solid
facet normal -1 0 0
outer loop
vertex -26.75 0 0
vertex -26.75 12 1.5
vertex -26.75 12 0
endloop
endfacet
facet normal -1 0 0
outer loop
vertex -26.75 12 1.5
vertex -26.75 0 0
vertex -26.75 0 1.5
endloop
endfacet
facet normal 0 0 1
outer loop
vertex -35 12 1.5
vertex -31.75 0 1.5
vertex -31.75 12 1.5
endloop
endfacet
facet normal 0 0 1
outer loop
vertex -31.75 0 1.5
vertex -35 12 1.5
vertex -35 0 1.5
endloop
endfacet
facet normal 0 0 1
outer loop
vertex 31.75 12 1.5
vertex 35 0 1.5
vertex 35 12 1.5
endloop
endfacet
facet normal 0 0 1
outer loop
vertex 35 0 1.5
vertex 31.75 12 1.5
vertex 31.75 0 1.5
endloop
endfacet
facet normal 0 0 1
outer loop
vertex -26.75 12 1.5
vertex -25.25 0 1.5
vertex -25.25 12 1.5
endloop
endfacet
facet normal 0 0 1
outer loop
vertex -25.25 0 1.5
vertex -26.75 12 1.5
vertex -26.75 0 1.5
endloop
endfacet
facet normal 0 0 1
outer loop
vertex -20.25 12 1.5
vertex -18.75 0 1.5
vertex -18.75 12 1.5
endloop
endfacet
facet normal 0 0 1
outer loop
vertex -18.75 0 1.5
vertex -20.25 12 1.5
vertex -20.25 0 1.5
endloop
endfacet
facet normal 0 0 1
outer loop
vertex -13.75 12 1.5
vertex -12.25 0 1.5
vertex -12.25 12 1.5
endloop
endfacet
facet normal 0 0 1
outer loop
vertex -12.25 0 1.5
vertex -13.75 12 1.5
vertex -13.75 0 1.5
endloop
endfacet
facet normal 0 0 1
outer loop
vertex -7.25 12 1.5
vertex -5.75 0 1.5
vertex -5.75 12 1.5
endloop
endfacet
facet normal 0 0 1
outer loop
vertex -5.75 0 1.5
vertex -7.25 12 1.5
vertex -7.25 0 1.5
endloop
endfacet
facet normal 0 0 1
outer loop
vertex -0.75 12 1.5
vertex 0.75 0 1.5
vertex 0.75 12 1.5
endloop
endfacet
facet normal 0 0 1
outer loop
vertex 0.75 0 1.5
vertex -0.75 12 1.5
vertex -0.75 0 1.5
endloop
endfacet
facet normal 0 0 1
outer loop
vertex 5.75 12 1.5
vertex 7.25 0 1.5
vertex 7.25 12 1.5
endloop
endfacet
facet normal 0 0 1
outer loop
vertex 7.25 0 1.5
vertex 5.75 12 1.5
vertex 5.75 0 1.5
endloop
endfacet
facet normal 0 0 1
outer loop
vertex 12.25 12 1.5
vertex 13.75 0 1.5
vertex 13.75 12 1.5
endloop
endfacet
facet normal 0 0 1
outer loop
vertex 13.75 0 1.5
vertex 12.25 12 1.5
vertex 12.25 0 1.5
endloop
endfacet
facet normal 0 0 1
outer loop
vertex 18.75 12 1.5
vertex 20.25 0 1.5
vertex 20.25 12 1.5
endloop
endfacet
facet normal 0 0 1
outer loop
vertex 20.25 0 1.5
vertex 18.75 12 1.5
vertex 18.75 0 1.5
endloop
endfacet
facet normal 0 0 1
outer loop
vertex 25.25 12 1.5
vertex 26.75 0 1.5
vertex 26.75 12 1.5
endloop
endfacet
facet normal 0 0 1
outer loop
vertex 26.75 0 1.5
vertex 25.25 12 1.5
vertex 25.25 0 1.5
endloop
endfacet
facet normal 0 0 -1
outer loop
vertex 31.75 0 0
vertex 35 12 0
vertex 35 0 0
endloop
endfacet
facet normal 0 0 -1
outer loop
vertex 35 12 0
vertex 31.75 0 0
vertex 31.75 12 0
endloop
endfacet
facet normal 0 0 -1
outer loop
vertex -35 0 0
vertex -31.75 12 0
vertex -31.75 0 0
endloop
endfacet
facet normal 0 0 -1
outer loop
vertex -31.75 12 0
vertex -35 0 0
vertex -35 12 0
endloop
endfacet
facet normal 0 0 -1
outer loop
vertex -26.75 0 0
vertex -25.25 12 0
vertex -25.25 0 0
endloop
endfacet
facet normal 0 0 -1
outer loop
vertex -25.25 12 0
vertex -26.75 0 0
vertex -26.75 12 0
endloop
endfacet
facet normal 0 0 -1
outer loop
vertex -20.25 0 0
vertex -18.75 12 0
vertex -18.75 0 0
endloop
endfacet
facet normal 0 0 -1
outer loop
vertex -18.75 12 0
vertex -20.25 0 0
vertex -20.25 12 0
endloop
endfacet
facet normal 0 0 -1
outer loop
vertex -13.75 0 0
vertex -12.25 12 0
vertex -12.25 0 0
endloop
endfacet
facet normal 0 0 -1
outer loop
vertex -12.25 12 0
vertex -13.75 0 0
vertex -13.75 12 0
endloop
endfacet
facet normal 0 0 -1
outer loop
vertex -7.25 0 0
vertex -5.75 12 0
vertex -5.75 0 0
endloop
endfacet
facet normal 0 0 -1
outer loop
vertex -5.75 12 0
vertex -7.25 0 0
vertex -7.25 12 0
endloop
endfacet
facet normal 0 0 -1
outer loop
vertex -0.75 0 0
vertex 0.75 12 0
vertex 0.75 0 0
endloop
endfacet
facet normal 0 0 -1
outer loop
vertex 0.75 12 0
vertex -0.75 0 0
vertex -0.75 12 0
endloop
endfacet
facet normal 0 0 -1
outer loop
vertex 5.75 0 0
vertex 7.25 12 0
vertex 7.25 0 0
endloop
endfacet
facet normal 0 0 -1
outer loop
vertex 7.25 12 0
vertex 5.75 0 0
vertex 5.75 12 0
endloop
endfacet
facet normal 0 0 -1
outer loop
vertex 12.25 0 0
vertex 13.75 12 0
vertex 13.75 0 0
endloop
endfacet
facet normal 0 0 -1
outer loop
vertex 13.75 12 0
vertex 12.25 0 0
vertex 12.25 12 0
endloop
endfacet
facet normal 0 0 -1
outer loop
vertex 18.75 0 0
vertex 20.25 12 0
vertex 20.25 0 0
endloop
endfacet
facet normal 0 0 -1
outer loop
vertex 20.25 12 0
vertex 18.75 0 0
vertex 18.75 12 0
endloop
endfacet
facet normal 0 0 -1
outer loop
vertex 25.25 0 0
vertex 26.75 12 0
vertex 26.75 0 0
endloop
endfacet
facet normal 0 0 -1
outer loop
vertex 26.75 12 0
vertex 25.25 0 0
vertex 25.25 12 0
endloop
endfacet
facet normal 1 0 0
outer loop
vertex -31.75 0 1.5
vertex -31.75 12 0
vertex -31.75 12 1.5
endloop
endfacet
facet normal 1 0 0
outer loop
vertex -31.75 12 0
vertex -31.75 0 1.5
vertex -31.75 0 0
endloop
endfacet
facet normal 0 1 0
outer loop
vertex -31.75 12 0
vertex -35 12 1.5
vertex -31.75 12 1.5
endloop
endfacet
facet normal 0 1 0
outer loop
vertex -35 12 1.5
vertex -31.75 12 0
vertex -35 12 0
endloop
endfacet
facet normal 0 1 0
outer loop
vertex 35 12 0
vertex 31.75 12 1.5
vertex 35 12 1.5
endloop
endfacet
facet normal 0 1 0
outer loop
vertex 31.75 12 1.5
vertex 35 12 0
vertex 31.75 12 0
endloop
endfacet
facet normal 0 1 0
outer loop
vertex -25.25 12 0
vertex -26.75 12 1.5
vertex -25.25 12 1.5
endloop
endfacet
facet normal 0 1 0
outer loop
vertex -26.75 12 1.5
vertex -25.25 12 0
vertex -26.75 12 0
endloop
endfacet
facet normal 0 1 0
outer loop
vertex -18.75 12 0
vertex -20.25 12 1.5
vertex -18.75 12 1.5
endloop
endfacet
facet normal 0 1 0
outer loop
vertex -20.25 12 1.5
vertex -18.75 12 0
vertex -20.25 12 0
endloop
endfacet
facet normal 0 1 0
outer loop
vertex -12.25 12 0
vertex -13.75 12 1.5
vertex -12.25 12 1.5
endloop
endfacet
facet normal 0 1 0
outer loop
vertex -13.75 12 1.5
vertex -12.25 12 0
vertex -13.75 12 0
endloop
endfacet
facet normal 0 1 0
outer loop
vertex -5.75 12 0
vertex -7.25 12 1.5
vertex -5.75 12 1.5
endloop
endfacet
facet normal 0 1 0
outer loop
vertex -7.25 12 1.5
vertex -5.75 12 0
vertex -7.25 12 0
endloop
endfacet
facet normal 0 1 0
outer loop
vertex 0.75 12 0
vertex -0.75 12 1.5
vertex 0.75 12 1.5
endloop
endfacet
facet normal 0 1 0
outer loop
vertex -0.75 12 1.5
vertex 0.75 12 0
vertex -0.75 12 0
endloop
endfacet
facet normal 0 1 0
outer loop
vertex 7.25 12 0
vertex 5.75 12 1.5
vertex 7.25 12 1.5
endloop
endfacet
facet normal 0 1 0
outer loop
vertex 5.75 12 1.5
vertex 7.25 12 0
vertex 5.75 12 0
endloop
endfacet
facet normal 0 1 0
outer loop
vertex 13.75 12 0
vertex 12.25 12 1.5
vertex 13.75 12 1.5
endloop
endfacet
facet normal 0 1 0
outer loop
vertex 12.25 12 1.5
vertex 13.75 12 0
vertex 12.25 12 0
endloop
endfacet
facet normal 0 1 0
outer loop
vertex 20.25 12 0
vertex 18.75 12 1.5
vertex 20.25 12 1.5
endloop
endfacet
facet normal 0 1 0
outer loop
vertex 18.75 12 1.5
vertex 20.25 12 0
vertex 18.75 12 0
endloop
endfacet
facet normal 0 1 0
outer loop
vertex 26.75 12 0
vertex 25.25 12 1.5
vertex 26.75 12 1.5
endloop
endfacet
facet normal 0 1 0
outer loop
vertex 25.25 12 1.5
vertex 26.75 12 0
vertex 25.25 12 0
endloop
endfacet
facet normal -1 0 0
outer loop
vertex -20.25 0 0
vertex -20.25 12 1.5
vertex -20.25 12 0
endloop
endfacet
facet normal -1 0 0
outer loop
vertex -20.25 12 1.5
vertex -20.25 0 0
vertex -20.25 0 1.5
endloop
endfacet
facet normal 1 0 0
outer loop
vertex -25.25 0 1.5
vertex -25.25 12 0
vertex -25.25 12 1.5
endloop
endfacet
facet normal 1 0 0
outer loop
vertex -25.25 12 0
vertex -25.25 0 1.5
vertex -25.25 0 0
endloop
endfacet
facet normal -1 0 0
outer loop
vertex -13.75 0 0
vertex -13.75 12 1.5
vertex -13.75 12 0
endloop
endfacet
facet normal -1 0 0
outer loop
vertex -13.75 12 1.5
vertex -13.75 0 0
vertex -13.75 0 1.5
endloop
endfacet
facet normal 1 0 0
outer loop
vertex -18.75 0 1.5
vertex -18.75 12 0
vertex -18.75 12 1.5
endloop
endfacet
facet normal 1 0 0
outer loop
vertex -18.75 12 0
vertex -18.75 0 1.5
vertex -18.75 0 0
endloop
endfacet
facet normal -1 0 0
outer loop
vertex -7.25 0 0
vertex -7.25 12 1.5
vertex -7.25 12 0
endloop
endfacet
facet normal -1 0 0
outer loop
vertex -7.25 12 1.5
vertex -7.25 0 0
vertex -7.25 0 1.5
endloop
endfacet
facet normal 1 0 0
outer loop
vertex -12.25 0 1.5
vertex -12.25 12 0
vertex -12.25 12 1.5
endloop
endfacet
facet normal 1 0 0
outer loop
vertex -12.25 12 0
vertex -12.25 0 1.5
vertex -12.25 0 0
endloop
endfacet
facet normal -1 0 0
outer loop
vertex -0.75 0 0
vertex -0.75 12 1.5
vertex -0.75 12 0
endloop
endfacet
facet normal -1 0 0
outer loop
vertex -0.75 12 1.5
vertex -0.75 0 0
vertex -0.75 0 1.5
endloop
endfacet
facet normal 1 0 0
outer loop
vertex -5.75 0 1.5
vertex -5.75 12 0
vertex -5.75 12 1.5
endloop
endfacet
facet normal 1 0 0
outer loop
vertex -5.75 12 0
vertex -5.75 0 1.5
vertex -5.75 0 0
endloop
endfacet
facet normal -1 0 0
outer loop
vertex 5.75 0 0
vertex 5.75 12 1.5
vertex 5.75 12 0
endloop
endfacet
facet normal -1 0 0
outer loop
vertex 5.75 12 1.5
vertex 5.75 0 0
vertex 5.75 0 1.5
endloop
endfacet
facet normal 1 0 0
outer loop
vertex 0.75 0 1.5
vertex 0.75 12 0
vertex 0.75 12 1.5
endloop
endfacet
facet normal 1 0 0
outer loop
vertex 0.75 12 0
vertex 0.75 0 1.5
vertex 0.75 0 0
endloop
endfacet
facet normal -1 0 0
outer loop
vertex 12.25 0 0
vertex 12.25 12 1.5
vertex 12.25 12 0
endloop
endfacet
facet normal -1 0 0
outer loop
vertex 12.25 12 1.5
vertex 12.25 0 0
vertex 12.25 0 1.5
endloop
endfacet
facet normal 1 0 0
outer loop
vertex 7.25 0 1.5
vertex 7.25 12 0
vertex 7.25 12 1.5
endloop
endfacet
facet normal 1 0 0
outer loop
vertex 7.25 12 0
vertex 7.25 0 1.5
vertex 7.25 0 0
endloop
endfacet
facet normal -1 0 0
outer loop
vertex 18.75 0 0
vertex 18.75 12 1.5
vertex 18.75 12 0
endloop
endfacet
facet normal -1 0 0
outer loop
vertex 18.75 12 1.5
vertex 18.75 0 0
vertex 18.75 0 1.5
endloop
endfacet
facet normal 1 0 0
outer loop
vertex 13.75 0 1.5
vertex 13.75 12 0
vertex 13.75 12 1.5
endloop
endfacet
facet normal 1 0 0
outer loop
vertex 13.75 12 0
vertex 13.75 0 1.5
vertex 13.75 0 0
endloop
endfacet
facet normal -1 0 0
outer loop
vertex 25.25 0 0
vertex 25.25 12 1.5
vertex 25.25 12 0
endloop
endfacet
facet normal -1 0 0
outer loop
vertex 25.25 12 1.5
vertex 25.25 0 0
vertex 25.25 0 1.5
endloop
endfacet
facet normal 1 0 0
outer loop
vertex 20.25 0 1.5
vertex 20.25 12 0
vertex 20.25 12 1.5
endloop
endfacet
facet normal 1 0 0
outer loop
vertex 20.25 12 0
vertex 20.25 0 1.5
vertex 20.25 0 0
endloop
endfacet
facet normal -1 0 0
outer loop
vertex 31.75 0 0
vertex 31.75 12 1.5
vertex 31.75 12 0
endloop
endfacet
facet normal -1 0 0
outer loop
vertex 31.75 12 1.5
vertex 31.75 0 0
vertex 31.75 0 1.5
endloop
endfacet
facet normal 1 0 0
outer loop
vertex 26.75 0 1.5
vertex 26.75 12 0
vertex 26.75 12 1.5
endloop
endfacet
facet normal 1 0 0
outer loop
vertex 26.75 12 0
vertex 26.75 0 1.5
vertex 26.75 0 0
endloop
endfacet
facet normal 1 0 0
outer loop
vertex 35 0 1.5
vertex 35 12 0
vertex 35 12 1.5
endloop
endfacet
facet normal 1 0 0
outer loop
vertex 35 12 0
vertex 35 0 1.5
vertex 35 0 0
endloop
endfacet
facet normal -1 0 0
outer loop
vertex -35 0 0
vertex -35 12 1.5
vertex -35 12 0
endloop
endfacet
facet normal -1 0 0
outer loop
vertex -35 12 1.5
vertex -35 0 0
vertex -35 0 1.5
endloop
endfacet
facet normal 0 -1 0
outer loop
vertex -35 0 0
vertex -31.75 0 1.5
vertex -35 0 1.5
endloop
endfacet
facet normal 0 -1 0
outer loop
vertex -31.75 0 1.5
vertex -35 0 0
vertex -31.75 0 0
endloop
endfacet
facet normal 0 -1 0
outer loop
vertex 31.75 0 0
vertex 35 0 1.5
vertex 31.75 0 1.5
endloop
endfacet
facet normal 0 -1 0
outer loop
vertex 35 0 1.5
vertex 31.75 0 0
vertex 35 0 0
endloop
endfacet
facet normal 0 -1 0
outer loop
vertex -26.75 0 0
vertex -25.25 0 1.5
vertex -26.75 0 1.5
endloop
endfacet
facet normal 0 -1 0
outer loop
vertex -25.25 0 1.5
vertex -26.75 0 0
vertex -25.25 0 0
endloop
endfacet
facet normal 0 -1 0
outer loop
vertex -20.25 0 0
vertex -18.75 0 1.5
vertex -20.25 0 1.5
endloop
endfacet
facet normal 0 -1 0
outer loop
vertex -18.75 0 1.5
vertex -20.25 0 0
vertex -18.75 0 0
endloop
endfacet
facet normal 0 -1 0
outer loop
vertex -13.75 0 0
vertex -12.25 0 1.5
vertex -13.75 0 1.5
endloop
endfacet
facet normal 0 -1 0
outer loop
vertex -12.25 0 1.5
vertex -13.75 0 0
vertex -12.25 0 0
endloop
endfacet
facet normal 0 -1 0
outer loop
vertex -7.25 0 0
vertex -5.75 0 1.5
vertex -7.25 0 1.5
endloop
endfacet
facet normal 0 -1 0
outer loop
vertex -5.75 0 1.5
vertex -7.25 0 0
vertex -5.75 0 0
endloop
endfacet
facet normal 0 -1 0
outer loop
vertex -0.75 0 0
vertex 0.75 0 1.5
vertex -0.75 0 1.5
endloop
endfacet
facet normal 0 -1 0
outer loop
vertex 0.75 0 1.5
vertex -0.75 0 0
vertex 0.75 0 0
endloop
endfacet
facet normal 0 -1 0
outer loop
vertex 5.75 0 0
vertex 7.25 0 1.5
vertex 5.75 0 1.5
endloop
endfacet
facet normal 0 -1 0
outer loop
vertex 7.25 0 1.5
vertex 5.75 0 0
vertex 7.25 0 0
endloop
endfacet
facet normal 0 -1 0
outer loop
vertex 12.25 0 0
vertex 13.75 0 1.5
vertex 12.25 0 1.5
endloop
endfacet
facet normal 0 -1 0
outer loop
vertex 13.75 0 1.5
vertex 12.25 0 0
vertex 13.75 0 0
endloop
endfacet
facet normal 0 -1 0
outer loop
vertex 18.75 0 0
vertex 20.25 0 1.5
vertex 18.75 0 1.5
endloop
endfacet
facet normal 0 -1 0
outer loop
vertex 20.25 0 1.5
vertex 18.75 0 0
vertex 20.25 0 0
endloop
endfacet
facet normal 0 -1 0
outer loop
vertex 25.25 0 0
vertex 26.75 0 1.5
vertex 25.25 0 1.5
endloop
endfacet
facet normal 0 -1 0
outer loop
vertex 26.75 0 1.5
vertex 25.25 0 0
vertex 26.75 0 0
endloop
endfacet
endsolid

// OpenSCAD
// 10-well comb for casting agarose gels
// Print orientation: flat on bed, teeth pointing down (-Y)

// ---- Parameters ----
plate_t      = 1.5;   // plate thickness (Z)
spine_l      = 70;    // spine length (X)
spine_w      = 12;    // spine width (Y)
tooth_n      = 10;    // number of teeth
tooth_w      = 5.0;   // tooth width (X)
tooth_l      = 12;    // tooth length (Y)
gap          = 1.5;   // gap between teeth (X)
eps          = 0.5;   // cutter overshoot past faces (Z)

$fn = 64;

// ---- Derived ----
pitch   = tooth_w + gap;          // centre-to-centre spacing
x0      = -(tooth_n - 1) * pitch / 2; // first tooth centre (row centred)

// ---- Model ----
difference() {
    union() {
        // Spine (back bar)
        translate([-spine_l / 2, 0, 0])
            cube([spine_l, spine_w, plate_t]);

        // Teeth
        for (i = [0 : tooth_n - 1])
            translate([x0 + i * pitch - tooth_w / 2,
                       -tooth_l,
                       0])
                cube([tooth_w, tooth_l + spine_w, plate_t]);
    }

    // Pockets for the wells (cut through the plate)
    for (i = [0 : tooth_n - 1])
        translate([x0 + i * pitch - tooth_w / 2,
                   -tooth_l - eps,
                   -eps])
            cube([tooth_w, tooth_l + spine_w + 2 * eps,
                  plate_t + 2 * eps]);
}
